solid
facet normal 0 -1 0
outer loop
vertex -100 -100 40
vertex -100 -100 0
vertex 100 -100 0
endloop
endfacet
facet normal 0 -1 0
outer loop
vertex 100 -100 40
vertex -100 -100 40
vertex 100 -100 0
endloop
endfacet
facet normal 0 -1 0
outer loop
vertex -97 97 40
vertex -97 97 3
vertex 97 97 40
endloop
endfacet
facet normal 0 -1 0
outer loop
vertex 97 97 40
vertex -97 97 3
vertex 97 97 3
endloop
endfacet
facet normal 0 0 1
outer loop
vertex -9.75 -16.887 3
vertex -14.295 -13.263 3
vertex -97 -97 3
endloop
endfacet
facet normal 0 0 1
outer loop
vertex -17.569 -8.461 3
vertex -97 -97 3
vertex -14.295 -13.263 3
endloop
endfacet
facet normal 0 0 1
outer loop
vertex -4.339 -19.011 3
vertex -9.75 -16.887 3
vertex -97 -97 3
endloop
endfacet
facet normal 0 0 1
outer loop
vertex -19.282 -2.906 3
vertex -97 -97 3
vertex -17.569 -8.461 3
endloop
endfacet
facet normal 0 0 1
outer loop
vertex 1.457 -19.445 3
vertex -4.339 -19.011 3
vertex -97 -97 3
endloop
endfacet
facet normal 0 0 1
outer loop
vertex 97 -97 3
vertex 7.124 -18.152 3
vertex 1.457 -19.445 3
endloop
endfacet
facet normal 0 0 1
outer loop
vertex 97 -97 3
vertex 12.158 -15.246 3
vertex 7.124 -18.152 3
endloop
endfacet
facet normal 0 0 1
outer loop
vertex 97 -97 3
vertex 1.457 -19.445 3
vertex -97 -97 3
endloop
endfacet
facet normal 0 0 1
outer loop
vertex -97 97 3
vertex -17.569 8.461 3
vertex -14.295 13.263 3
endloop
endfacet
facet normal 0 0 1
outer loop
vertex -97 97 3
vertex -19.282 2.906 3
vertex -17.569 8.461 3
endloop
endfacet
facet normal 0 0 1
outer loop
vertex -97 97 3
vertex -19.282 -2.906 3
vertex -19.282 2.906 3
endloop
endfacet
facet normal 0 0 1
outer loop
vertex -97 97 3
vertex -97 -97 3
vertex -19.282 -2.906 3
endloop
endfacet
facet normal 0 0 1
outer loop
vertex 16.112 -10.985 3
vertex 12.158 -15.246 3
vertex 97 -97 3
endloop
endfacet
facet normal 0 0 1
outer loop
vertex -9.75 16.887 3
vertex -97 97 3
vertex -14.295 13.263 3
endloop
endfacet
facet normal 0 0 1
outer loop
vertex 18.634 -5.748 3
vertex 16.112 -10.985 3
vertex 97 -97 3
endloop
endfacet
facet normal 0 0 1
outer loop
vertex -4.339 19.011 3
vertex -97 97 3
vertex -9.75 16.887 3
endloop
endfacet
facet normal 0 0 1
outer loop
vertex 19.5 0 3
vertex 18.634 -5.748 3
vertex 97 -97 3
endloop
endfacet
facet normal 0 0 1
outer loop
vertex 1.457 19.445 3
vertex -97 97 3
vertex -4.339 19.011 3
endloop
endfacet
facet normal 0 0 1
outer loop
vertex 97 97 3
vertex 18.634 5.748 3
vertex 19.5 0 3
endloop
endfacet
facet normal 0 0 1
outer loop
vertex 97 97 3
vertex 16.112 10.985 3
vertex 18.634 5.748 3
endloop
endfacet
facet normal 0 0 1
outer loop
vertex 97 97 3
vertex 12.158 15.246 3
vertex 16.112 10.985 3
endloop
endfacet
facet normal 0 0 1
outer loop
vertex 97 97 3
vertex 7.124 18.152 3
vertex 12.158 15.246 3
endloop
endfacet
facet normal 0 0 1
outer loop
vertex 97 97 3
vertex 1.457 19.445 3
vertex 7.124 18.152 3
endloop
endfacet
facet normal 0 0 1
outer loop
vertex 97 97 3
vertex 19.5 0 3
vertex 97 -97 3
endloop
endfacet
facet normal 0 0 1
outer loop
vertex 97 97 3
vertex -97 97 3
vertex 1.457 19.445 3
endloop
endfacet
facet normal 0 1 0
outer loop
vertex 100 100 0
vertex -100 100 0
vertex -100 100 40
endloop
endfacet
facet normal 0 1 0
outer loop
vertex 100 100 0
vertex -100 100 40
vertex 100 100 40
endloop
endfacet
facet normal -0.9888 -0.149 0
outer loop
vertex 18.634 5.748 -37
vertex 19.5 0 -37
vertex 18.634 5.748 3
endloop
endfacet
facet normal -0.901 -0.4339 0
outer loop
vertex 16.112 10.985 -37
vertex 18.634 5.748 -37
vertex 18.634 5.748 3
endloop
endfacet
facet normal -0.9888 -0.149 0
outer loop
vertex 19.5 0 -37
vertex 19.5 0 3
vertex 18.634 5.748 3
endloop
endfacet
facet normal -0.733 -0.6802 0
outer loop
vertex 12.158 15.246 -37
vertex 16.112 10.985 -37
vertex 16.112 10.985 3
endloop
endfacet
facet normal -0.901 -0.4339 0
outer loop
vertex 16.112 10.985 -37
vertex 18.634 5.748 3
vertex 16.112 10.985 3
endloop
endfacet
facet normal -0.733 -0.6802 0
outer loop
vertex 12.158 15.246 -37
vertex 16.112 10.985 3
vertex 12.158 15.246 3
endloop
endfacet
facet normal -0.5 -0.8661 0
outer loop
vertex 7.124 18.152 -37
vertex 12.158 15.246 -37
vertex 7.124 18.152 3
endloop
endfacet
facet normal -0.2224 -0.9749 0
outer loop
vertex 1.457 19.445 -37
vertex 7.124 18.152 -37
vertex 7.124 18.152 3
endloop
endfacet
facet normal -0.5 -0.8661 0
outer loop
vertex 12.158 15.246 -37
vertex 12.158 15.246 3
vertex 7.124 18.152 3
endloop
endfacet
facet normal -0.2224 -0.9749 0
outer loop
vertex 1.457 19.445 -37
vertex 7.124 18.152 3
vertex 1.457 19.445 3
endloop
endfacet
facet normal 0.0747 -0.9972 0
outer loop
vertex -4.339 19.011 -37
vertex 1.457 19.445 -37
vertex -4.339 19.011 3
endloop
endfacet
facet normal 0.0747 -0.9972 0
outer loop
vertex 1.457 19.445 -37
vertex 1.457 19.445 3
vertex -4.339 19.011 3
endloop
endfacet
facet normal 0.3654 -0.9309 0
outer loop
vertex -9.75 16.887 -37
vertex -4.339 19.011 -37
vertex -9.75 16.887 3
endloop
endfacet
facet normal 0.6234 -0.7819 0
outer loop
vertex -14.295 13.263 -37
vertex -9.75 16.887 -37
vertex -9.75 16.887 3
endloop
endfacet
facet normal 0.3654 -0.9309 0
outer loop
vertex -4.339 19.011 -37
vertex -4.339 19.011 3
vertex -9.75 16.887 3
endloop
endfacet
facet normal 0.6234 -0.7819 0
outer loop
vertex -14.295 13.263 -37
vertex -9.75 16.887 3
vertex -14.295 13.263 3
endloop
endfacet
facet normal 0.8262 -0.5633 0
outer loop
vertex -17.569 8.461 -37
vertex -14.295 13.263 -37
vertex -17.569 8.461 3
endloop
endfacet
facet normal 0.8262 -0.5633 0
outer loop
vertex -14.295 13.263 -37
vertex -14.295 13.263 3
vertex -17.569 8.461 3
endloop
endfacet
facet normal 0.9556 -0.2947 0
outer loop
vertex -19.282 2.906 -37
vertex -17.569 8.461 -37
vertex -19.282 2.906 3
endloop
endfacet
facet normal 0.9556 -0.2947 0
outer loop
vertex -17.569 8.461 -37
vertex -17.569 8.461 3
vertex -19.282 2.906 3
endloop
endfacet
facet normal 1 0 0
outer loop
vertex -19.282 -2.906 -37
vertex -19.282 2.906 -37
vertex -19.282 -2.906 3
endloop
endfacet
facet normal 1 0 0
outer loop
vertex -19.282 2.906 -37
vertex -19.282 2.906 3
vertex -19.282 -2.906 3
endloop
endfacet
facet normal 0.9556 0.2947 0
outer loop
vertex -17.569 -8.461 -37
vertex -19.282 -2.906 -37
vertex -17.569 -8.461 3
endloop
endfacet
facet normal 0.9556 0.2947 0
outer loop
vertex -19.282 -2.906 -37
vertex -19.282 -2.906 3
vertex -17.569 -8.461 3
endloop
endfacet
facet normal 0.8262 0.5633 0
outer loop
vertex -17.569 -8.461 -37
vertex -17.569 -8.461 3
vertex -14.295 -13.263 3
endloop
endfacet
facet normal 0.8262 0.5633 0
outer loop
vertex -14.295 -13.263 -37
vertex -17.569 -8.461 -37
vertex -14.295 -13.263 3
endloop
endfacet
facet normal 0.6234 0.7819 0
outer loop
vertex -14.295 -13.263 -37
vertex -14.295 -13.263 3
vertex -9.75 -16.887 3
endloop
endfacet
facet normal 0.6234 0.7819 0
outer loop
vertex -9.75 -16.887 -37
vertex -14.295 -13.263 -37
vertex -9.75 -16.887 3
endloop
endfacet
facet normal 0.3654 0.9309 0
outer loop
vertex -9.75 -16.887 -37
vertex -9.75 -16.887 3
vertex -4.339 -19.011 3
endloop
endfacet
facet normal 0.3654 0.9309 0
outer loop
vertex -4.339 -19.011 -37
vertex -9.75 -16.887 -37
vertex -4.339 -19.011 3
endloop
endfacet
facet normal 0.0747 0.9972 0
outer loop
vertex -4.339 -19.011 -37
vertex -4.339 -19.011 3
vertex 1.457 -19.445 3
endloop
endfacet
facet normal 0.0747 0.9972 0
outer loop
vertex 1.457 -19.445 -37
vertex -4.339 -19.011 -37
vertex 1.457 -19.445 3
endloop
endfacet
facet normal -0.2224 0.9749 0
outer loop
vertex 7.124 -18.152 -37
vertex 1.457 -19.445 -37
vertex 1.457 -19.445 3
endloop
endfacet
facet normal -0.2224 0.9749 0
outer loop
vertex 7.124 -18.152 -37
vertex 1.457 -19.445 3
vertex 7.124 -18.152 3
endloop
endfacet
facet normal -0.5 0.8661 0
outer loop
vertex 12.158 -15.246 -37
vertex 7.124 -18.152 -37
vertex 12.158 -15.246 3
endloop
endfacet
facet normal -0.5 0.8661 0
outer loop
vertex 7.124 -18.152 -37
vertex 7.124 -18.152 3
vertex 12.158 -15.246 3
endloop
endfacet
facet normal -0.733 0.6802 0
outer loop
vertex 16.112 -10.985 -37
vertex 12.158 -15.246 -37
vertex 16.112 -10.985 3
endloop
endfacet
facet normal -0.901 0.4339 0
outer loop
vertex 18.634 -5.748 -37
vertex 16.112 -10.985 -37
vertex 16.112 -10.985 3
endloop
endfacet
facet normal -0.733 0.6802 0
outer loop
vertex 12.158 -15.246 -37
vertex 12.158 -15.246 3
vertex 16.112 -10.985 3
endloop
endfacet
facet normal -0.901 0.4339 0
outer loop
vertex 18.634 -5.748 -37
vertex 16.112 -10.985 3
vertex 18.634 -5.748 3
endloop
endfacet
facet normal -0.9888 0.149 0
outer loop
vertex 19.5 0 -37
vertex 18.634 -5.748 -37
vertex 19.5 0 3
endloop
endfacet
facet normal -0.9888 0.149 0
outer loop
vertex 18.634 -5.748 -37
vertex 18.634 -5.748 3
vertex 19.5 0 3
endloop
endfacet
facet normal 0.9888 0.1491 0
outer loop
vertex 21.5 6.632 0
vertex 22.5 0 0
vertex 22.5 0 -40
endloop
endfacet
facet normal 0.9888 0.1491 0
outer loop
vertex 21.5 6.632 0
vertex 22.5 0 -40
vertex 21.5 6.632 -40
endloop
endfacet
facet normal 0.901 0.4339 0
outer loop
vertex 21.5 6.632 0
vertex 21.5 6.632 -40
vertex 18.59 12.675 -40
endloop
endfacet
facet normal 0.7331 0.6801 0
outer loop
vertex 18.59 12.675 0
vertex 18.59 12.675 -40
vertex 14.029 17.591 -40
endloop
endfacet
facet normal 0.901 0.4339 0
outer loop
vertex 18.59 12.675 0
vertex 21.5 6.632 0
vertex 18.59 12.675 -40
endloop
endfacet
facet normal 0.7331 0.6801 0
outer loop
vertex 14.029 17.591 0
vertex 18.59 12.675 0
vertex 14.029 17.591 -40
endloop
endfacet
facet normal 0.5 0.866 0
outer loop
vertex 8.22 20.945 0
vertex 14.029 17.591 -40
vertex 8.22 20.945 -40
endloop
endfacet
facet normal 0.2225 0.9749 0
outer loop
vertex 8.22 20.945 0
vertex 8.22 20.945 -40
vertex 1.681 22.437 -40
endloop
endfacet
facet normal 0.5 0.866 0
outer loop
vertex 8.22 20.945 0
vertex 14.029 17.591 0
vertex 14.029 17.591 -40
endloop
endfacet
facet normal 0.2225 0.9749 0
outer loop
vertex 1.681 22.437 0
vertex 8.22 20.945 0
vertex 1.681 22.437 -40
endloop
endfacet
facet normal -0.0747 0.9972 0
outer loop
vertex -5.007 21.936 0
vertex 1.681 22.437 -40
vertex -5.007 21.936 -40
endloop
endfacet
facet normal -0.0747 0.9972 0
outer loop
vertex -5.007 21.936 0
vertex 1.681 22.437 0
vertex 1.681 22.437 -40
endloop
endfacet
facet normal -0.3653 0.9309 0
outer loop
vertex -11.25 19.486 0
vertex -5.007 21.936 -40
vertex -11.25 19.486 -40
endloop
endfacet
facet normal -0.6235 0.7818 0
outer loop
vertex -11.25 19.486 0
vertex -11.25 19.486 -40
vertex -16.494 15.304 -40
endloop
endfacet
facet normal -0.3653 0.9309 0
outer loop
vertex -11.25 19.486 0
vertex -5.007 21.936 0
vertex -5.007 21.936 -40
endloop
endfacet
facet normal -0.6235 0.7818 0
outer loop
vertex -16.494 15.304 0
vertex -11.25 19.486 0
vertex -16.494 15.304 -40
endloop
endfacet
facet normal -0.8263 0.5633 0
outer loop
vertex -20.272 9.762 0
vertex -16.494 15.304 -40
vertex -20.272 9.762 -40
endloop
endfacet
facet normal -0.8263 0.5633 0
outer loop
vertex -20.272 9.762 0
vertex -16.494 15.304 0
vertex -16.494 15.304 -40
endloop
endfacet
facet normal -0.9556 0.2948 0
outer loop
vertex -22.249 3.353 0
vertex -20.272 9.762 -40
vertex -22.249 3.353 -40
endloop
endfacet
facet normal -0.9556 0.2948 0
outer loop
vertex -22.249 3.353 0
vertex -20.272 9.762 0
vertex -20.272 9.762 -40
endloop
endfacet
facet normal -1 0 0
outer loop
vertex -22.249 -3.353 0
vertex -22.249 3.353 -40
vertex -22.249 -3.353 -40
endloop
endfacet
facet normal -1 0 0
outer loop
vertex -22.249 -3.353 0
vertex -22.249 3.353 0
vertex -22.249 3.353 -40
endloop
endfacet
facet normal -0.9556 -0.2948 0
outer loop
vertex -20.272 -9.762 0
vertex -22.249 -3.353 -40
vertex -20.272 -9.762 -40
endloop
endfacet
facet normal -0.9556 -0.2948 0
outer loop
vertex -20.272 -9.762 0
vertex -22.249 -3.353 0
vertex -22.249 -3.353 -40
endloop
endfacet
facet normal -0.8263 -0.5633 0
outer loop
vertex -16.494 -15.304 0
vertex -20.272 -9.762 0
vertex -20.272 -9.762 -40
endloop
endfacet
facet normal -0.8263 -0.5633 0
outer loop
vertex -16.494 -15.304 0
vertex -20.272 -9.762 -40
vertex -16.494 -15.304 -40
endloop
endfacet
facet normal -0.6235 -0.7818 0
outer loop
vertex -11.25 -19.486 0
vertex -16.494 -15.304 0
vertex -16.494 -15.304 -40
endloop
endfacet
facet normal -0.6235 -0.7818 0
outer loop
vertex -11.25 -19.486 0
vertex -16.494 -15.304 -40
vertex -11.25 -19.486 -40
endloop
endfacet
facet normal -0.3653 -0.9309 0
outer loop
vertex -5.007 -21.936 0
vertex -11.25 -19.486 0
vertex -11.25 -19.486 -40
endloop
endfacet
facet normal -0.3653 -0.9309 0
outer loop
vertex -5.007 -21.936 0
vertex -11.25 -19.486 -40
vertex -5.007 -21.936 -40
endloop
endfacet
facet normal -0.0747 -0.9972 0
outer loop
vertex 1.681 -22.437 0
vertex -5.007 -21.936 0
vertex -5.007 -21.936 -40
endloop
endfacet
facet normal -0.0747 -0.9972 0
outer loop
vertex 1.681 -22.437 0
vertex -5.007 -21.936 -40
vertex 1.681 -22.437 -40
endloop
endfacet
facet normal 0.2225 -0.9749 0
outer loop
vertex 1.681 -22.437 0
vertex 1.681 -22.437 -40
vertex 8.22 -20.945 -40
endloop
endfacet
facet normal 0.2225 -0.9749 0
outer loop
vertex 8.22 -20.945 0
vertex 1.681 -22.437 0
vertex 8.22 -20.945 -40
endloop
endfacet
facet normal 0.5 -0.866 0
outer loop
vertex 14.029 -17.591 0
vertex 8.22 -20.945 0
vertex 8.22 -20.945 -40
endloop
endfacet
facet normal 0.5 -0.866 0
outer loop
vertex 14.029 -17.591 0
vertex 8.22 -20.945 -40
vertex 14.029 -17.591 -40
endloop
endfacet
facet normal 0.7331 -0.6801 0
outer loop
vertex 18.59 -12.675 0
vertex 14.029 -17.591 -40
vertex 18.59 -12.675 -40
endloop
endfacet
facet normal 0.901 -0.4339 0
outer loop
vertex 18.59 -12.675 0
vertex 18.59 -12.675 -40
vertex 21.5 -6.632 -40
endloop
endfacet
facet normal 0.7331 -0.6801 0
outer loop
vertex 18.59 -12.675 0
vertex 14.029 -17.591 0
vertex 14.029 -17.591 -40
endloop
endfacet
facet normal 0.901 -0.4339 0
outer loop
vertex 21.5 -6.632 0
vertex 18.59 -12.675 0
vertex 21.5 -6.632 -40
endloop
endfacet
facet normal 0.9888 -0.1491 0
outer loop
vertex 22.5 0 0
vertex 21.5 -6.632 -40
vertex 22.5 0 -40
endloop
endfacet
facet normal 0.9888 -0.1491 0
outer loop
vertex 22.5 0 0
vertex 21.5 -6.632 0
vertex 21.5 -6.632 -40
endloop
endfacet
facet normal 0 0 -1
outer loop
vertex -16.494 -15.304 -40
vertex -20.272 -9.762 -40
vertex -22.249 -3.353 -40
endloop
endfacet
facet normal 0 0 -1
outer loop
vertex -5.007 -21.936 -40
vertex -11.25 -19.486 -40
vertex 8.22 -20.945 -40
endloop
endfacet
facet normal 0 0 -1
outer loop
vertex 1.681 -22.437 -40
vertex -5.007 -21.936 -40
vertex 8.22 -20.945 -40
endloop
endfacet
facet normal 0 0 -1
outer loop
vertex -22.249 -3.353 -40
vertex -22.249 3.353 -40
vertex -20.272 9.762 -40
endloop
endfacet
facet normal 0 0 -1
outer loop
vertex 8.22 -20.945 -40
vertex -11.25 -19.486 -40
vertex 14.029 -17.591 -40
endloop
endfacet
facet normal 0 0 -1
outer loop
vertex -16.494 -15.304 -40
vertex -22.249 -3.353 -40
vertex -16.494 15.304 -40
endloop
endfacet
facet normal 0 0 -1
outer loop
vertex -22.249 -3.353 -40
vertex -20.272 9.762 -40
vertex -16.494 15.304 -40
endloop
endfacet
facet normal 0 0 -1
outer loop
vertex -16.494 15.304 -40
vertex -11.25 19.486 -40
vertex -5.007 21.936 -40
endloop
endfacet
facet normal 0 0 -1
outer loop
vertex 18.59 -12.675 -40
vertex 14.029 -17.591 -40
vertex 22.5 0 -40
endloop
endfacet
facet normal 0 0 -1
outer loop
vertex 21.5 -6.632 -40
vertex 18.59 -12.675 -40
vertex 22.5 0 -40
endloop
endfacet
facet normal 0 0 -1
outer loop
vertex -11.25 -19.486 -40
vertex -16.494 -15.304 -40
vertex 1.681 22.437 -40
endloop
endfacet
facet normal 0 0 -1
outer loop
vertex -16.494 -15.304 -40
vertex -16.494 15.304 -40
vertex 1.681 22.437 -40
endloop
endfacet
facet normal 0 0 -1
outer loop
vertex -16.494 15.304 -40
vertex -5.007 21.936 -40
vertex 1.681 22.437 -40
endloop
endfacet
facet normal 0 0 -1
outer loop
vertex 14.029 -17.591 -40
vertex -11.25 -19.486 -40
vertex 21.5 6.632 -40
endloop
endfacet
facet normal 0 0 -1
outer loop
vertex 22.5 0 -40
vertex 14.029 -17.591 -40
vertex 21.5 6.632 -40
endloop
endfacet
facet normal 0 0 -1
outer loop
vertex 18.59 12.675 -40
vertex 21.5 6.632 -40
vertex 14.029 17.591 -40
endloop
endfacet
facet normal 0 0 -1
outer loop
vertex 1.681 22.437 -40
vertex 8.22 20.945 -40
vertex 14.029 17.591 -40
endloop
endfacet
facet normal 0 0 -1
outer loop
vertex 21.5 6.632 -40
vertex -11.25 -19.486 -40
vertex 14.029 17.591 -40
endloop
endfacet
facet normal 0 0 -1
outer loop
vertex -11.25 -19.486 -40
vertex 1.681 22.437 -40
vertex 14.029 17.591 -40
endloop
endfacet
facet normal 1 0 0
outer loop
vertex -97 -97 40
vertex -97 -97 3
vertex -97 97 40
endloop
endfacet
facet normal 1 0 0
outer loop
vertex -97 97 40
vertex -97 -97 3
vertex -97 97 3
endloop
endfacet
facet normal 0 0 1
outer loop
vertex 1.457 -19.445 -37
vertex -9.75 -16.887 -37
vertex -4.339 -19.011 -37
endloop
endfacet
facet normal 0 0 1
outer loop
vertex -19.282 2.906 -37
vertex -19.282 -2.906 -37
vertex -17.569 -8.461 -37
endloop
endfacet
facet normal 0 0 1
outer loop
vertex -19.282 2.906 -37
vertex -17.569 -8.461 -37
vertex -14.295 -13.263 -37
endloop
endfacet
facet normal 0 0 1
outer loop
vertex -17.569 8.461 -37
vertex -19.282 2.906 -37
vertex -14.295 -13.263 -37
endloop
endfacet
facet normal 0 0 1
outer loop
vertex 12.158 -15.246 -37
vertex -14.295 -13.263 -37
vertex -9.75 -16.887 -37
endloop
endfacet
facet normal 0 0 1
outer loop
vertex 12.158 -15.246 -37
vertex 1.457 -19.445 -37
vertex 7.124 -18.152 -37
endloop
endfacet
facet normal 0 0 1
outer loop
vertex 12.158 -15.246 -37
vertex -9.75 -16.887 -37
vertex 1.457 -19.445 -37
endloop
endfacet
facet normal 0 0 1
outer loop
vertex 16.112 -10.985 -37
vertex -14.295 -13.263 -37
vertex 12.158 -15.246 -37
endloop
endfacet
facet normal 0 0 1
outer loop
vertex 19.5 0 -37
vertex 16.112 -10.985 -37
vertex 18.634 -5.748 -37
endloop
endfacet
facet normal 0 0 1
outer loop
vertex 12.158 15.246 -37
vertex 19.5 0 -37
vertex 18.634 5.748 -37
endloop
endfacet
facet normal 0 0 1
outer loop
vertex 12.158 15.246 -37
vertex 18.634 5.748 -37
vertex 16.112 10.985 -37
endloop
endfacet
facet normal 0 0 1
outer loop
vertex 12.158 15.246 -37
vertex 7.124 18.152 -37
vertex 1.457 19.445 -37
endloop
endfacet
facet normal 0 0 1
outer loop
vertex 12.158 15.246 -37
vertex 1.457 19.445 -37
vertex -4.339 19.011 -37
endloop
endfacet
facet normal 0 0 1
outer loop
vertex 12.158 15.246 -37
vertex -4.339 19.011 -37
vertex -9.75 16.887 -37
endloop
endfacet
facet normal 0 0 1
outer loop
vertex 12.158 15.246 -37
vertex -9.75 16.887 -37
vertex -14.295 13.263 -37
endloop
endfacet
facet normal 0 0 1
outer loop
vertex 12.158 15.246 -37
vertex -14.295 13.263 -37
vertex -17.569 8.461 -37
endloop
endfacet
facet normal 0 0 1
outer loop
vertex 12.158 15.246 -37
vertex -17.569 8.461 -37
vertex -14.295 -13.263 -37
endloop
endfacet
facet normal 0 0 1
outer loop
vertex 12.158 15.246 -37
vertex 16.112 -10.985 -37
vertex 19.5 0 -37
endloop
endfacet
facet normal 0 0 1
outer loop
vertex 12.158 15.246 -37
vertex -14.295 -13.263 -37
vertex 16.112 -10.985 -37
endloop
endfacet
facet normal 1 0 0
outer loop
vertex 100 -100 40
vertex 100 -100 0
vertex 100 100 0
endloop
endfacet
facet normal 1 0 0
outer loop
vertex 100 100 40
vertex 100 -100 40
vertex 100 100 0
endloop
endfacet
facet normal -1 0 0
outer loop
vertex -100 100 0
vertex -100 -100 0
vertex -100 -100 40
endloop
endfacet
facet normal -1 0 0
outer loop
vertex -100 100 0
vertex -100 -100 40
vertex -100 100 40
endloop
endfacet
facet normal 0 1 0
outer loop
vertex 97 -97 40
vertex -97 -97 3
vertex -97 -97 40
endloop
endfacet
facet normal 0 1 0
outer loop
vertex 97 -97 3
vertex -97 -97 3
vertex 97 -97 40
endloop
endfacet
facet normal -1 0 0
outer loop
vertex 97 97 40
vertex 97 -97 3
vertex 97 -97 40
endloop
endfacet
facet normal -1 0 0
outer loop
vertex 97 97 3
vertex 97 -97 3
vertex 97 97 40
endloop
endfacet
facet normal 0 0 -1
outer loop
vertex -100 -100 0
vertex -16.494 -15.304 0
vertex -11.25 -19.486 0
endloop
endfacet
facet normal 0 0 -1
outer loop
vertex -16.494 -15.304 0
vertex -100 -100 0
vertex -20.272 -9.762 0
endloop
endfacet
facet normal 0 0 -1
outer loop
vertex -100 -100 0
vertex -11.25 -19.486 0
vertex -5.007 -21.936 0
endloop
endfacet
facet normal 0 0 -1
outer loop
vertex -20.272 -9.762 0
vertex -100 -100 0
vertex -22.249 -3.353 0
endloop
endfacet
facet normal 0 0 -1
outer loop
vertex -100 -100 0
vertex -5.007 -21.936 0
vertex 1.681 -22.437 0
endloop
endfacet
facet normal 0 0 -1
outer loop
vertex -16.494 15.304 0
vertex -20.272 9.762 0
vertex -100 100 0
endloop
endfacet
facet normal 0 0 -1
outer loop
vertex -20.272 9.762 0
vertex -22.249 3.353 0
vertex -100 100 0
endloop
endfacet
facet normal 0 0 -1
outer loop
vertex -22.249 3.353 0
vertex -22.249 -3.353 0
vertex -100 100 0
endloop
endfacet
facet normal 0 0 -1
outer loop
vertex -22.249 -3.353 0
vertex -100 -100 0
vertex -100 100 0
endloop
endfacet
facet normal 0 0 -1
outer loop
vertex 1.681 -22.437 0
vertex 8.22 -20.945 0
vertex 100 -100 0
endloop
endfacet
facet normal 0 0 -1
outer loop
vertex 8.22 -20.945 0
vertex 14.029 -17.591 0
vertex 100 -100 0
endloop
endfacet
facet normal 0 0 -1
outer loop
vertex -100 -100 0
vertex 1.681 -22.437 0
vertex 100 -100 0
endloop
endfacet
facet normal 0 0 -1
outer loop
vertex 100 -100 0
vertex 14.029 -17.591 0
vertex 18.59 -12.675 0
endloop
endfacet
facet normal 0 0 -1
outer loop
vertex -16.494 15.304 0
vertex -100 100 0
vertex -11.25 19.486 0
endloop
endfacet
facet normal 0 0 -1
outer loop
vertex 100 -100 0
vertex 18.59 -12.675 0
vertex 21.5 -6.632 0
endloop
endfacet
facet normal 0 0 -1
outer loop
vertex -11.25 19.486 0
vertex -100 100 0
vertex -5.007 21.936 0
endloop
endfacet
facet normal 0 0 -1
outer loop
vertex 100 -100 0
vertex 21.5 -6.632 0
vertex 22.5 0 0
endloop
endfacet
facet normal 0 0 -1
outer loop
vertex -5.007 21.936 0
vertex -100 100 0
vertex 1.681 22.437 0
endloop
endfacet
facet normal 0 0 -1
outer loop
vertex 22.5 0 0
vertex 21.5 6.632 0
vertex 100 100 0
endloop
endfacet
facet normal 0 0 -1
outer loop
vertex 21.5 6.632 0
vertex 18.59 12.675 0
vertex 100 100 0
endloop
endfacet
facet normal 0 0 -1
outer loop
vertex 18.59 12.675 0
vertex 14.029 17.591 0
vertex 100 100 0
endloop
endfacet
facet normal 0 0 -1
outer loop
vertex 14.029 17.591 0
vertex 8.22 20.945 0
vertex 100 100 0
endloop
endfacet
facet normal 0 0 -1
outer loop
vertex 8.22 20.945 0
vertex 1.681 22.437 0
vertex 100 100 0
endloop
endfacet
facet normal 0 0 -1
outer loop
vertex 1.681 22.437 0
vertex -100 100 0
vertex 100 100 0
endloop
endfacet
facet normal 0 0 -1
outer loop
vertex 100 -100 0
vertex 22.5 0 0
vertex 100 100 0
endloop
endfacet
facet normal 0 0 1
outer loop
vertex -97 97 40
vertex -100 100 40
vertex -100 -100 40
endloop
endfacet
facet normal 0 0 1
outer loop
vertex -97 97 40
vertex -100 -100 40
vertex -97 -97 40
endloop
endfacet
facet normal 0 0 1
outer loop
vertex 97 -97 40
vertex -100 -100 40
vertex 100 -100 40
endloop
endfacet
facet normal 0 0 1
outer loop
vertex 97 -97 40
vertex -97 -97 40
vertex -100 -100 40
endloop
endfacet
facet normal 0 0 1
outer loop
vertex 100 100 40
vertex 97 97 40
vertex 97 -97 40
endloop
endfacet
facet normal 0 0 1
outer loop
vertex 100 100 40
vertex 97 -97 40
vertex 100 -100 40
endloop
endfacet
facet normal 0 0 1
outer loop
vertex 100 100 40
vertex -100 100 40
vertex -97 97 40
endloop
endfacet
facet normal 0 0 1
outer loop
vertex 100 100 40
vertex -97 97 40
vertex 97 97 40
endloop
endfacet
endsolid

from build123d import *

# Parameters (mm, degrees)
SKETCH_1_W      = 200
SKETCH_1_H      = 200
EXTRUDE_1_DEPTH = 40
SKETCH_2_R      = 22.5
EXTRUDE_2_DEPTH = 40
SHELL_1_T       = -3


with BuildPart() as part:
    # ｽｹｯﾁ1 → ﾎﾞｽ - 押し出し1 (new body)
    with BuildSketch(Plane.XY):
        Rectangle(SKETCH_1_W, SKETCH_1_H)
    extrude(amount=EXTRUDE_1_DEPTH)

    # ｽｹｯﾁ2 → ﾎﾞｽ - 押し出し2 (add)
    with BuildSketch(Plane.XY):
        Circle(SKETCH_2_R)
    extrude(amount=-EXTRUDE_2_DEPTH)

    # ｼｪﾙ1
    shell_1_openings = [part.faces().sort_by_distance(p)[0] for p in [
        (0, 0, 40),
    ]]
    offset(amount=SHELL_1_T, openings=shell_1_openings, kind=Kind.INTERSECTION)


solid = part.part
